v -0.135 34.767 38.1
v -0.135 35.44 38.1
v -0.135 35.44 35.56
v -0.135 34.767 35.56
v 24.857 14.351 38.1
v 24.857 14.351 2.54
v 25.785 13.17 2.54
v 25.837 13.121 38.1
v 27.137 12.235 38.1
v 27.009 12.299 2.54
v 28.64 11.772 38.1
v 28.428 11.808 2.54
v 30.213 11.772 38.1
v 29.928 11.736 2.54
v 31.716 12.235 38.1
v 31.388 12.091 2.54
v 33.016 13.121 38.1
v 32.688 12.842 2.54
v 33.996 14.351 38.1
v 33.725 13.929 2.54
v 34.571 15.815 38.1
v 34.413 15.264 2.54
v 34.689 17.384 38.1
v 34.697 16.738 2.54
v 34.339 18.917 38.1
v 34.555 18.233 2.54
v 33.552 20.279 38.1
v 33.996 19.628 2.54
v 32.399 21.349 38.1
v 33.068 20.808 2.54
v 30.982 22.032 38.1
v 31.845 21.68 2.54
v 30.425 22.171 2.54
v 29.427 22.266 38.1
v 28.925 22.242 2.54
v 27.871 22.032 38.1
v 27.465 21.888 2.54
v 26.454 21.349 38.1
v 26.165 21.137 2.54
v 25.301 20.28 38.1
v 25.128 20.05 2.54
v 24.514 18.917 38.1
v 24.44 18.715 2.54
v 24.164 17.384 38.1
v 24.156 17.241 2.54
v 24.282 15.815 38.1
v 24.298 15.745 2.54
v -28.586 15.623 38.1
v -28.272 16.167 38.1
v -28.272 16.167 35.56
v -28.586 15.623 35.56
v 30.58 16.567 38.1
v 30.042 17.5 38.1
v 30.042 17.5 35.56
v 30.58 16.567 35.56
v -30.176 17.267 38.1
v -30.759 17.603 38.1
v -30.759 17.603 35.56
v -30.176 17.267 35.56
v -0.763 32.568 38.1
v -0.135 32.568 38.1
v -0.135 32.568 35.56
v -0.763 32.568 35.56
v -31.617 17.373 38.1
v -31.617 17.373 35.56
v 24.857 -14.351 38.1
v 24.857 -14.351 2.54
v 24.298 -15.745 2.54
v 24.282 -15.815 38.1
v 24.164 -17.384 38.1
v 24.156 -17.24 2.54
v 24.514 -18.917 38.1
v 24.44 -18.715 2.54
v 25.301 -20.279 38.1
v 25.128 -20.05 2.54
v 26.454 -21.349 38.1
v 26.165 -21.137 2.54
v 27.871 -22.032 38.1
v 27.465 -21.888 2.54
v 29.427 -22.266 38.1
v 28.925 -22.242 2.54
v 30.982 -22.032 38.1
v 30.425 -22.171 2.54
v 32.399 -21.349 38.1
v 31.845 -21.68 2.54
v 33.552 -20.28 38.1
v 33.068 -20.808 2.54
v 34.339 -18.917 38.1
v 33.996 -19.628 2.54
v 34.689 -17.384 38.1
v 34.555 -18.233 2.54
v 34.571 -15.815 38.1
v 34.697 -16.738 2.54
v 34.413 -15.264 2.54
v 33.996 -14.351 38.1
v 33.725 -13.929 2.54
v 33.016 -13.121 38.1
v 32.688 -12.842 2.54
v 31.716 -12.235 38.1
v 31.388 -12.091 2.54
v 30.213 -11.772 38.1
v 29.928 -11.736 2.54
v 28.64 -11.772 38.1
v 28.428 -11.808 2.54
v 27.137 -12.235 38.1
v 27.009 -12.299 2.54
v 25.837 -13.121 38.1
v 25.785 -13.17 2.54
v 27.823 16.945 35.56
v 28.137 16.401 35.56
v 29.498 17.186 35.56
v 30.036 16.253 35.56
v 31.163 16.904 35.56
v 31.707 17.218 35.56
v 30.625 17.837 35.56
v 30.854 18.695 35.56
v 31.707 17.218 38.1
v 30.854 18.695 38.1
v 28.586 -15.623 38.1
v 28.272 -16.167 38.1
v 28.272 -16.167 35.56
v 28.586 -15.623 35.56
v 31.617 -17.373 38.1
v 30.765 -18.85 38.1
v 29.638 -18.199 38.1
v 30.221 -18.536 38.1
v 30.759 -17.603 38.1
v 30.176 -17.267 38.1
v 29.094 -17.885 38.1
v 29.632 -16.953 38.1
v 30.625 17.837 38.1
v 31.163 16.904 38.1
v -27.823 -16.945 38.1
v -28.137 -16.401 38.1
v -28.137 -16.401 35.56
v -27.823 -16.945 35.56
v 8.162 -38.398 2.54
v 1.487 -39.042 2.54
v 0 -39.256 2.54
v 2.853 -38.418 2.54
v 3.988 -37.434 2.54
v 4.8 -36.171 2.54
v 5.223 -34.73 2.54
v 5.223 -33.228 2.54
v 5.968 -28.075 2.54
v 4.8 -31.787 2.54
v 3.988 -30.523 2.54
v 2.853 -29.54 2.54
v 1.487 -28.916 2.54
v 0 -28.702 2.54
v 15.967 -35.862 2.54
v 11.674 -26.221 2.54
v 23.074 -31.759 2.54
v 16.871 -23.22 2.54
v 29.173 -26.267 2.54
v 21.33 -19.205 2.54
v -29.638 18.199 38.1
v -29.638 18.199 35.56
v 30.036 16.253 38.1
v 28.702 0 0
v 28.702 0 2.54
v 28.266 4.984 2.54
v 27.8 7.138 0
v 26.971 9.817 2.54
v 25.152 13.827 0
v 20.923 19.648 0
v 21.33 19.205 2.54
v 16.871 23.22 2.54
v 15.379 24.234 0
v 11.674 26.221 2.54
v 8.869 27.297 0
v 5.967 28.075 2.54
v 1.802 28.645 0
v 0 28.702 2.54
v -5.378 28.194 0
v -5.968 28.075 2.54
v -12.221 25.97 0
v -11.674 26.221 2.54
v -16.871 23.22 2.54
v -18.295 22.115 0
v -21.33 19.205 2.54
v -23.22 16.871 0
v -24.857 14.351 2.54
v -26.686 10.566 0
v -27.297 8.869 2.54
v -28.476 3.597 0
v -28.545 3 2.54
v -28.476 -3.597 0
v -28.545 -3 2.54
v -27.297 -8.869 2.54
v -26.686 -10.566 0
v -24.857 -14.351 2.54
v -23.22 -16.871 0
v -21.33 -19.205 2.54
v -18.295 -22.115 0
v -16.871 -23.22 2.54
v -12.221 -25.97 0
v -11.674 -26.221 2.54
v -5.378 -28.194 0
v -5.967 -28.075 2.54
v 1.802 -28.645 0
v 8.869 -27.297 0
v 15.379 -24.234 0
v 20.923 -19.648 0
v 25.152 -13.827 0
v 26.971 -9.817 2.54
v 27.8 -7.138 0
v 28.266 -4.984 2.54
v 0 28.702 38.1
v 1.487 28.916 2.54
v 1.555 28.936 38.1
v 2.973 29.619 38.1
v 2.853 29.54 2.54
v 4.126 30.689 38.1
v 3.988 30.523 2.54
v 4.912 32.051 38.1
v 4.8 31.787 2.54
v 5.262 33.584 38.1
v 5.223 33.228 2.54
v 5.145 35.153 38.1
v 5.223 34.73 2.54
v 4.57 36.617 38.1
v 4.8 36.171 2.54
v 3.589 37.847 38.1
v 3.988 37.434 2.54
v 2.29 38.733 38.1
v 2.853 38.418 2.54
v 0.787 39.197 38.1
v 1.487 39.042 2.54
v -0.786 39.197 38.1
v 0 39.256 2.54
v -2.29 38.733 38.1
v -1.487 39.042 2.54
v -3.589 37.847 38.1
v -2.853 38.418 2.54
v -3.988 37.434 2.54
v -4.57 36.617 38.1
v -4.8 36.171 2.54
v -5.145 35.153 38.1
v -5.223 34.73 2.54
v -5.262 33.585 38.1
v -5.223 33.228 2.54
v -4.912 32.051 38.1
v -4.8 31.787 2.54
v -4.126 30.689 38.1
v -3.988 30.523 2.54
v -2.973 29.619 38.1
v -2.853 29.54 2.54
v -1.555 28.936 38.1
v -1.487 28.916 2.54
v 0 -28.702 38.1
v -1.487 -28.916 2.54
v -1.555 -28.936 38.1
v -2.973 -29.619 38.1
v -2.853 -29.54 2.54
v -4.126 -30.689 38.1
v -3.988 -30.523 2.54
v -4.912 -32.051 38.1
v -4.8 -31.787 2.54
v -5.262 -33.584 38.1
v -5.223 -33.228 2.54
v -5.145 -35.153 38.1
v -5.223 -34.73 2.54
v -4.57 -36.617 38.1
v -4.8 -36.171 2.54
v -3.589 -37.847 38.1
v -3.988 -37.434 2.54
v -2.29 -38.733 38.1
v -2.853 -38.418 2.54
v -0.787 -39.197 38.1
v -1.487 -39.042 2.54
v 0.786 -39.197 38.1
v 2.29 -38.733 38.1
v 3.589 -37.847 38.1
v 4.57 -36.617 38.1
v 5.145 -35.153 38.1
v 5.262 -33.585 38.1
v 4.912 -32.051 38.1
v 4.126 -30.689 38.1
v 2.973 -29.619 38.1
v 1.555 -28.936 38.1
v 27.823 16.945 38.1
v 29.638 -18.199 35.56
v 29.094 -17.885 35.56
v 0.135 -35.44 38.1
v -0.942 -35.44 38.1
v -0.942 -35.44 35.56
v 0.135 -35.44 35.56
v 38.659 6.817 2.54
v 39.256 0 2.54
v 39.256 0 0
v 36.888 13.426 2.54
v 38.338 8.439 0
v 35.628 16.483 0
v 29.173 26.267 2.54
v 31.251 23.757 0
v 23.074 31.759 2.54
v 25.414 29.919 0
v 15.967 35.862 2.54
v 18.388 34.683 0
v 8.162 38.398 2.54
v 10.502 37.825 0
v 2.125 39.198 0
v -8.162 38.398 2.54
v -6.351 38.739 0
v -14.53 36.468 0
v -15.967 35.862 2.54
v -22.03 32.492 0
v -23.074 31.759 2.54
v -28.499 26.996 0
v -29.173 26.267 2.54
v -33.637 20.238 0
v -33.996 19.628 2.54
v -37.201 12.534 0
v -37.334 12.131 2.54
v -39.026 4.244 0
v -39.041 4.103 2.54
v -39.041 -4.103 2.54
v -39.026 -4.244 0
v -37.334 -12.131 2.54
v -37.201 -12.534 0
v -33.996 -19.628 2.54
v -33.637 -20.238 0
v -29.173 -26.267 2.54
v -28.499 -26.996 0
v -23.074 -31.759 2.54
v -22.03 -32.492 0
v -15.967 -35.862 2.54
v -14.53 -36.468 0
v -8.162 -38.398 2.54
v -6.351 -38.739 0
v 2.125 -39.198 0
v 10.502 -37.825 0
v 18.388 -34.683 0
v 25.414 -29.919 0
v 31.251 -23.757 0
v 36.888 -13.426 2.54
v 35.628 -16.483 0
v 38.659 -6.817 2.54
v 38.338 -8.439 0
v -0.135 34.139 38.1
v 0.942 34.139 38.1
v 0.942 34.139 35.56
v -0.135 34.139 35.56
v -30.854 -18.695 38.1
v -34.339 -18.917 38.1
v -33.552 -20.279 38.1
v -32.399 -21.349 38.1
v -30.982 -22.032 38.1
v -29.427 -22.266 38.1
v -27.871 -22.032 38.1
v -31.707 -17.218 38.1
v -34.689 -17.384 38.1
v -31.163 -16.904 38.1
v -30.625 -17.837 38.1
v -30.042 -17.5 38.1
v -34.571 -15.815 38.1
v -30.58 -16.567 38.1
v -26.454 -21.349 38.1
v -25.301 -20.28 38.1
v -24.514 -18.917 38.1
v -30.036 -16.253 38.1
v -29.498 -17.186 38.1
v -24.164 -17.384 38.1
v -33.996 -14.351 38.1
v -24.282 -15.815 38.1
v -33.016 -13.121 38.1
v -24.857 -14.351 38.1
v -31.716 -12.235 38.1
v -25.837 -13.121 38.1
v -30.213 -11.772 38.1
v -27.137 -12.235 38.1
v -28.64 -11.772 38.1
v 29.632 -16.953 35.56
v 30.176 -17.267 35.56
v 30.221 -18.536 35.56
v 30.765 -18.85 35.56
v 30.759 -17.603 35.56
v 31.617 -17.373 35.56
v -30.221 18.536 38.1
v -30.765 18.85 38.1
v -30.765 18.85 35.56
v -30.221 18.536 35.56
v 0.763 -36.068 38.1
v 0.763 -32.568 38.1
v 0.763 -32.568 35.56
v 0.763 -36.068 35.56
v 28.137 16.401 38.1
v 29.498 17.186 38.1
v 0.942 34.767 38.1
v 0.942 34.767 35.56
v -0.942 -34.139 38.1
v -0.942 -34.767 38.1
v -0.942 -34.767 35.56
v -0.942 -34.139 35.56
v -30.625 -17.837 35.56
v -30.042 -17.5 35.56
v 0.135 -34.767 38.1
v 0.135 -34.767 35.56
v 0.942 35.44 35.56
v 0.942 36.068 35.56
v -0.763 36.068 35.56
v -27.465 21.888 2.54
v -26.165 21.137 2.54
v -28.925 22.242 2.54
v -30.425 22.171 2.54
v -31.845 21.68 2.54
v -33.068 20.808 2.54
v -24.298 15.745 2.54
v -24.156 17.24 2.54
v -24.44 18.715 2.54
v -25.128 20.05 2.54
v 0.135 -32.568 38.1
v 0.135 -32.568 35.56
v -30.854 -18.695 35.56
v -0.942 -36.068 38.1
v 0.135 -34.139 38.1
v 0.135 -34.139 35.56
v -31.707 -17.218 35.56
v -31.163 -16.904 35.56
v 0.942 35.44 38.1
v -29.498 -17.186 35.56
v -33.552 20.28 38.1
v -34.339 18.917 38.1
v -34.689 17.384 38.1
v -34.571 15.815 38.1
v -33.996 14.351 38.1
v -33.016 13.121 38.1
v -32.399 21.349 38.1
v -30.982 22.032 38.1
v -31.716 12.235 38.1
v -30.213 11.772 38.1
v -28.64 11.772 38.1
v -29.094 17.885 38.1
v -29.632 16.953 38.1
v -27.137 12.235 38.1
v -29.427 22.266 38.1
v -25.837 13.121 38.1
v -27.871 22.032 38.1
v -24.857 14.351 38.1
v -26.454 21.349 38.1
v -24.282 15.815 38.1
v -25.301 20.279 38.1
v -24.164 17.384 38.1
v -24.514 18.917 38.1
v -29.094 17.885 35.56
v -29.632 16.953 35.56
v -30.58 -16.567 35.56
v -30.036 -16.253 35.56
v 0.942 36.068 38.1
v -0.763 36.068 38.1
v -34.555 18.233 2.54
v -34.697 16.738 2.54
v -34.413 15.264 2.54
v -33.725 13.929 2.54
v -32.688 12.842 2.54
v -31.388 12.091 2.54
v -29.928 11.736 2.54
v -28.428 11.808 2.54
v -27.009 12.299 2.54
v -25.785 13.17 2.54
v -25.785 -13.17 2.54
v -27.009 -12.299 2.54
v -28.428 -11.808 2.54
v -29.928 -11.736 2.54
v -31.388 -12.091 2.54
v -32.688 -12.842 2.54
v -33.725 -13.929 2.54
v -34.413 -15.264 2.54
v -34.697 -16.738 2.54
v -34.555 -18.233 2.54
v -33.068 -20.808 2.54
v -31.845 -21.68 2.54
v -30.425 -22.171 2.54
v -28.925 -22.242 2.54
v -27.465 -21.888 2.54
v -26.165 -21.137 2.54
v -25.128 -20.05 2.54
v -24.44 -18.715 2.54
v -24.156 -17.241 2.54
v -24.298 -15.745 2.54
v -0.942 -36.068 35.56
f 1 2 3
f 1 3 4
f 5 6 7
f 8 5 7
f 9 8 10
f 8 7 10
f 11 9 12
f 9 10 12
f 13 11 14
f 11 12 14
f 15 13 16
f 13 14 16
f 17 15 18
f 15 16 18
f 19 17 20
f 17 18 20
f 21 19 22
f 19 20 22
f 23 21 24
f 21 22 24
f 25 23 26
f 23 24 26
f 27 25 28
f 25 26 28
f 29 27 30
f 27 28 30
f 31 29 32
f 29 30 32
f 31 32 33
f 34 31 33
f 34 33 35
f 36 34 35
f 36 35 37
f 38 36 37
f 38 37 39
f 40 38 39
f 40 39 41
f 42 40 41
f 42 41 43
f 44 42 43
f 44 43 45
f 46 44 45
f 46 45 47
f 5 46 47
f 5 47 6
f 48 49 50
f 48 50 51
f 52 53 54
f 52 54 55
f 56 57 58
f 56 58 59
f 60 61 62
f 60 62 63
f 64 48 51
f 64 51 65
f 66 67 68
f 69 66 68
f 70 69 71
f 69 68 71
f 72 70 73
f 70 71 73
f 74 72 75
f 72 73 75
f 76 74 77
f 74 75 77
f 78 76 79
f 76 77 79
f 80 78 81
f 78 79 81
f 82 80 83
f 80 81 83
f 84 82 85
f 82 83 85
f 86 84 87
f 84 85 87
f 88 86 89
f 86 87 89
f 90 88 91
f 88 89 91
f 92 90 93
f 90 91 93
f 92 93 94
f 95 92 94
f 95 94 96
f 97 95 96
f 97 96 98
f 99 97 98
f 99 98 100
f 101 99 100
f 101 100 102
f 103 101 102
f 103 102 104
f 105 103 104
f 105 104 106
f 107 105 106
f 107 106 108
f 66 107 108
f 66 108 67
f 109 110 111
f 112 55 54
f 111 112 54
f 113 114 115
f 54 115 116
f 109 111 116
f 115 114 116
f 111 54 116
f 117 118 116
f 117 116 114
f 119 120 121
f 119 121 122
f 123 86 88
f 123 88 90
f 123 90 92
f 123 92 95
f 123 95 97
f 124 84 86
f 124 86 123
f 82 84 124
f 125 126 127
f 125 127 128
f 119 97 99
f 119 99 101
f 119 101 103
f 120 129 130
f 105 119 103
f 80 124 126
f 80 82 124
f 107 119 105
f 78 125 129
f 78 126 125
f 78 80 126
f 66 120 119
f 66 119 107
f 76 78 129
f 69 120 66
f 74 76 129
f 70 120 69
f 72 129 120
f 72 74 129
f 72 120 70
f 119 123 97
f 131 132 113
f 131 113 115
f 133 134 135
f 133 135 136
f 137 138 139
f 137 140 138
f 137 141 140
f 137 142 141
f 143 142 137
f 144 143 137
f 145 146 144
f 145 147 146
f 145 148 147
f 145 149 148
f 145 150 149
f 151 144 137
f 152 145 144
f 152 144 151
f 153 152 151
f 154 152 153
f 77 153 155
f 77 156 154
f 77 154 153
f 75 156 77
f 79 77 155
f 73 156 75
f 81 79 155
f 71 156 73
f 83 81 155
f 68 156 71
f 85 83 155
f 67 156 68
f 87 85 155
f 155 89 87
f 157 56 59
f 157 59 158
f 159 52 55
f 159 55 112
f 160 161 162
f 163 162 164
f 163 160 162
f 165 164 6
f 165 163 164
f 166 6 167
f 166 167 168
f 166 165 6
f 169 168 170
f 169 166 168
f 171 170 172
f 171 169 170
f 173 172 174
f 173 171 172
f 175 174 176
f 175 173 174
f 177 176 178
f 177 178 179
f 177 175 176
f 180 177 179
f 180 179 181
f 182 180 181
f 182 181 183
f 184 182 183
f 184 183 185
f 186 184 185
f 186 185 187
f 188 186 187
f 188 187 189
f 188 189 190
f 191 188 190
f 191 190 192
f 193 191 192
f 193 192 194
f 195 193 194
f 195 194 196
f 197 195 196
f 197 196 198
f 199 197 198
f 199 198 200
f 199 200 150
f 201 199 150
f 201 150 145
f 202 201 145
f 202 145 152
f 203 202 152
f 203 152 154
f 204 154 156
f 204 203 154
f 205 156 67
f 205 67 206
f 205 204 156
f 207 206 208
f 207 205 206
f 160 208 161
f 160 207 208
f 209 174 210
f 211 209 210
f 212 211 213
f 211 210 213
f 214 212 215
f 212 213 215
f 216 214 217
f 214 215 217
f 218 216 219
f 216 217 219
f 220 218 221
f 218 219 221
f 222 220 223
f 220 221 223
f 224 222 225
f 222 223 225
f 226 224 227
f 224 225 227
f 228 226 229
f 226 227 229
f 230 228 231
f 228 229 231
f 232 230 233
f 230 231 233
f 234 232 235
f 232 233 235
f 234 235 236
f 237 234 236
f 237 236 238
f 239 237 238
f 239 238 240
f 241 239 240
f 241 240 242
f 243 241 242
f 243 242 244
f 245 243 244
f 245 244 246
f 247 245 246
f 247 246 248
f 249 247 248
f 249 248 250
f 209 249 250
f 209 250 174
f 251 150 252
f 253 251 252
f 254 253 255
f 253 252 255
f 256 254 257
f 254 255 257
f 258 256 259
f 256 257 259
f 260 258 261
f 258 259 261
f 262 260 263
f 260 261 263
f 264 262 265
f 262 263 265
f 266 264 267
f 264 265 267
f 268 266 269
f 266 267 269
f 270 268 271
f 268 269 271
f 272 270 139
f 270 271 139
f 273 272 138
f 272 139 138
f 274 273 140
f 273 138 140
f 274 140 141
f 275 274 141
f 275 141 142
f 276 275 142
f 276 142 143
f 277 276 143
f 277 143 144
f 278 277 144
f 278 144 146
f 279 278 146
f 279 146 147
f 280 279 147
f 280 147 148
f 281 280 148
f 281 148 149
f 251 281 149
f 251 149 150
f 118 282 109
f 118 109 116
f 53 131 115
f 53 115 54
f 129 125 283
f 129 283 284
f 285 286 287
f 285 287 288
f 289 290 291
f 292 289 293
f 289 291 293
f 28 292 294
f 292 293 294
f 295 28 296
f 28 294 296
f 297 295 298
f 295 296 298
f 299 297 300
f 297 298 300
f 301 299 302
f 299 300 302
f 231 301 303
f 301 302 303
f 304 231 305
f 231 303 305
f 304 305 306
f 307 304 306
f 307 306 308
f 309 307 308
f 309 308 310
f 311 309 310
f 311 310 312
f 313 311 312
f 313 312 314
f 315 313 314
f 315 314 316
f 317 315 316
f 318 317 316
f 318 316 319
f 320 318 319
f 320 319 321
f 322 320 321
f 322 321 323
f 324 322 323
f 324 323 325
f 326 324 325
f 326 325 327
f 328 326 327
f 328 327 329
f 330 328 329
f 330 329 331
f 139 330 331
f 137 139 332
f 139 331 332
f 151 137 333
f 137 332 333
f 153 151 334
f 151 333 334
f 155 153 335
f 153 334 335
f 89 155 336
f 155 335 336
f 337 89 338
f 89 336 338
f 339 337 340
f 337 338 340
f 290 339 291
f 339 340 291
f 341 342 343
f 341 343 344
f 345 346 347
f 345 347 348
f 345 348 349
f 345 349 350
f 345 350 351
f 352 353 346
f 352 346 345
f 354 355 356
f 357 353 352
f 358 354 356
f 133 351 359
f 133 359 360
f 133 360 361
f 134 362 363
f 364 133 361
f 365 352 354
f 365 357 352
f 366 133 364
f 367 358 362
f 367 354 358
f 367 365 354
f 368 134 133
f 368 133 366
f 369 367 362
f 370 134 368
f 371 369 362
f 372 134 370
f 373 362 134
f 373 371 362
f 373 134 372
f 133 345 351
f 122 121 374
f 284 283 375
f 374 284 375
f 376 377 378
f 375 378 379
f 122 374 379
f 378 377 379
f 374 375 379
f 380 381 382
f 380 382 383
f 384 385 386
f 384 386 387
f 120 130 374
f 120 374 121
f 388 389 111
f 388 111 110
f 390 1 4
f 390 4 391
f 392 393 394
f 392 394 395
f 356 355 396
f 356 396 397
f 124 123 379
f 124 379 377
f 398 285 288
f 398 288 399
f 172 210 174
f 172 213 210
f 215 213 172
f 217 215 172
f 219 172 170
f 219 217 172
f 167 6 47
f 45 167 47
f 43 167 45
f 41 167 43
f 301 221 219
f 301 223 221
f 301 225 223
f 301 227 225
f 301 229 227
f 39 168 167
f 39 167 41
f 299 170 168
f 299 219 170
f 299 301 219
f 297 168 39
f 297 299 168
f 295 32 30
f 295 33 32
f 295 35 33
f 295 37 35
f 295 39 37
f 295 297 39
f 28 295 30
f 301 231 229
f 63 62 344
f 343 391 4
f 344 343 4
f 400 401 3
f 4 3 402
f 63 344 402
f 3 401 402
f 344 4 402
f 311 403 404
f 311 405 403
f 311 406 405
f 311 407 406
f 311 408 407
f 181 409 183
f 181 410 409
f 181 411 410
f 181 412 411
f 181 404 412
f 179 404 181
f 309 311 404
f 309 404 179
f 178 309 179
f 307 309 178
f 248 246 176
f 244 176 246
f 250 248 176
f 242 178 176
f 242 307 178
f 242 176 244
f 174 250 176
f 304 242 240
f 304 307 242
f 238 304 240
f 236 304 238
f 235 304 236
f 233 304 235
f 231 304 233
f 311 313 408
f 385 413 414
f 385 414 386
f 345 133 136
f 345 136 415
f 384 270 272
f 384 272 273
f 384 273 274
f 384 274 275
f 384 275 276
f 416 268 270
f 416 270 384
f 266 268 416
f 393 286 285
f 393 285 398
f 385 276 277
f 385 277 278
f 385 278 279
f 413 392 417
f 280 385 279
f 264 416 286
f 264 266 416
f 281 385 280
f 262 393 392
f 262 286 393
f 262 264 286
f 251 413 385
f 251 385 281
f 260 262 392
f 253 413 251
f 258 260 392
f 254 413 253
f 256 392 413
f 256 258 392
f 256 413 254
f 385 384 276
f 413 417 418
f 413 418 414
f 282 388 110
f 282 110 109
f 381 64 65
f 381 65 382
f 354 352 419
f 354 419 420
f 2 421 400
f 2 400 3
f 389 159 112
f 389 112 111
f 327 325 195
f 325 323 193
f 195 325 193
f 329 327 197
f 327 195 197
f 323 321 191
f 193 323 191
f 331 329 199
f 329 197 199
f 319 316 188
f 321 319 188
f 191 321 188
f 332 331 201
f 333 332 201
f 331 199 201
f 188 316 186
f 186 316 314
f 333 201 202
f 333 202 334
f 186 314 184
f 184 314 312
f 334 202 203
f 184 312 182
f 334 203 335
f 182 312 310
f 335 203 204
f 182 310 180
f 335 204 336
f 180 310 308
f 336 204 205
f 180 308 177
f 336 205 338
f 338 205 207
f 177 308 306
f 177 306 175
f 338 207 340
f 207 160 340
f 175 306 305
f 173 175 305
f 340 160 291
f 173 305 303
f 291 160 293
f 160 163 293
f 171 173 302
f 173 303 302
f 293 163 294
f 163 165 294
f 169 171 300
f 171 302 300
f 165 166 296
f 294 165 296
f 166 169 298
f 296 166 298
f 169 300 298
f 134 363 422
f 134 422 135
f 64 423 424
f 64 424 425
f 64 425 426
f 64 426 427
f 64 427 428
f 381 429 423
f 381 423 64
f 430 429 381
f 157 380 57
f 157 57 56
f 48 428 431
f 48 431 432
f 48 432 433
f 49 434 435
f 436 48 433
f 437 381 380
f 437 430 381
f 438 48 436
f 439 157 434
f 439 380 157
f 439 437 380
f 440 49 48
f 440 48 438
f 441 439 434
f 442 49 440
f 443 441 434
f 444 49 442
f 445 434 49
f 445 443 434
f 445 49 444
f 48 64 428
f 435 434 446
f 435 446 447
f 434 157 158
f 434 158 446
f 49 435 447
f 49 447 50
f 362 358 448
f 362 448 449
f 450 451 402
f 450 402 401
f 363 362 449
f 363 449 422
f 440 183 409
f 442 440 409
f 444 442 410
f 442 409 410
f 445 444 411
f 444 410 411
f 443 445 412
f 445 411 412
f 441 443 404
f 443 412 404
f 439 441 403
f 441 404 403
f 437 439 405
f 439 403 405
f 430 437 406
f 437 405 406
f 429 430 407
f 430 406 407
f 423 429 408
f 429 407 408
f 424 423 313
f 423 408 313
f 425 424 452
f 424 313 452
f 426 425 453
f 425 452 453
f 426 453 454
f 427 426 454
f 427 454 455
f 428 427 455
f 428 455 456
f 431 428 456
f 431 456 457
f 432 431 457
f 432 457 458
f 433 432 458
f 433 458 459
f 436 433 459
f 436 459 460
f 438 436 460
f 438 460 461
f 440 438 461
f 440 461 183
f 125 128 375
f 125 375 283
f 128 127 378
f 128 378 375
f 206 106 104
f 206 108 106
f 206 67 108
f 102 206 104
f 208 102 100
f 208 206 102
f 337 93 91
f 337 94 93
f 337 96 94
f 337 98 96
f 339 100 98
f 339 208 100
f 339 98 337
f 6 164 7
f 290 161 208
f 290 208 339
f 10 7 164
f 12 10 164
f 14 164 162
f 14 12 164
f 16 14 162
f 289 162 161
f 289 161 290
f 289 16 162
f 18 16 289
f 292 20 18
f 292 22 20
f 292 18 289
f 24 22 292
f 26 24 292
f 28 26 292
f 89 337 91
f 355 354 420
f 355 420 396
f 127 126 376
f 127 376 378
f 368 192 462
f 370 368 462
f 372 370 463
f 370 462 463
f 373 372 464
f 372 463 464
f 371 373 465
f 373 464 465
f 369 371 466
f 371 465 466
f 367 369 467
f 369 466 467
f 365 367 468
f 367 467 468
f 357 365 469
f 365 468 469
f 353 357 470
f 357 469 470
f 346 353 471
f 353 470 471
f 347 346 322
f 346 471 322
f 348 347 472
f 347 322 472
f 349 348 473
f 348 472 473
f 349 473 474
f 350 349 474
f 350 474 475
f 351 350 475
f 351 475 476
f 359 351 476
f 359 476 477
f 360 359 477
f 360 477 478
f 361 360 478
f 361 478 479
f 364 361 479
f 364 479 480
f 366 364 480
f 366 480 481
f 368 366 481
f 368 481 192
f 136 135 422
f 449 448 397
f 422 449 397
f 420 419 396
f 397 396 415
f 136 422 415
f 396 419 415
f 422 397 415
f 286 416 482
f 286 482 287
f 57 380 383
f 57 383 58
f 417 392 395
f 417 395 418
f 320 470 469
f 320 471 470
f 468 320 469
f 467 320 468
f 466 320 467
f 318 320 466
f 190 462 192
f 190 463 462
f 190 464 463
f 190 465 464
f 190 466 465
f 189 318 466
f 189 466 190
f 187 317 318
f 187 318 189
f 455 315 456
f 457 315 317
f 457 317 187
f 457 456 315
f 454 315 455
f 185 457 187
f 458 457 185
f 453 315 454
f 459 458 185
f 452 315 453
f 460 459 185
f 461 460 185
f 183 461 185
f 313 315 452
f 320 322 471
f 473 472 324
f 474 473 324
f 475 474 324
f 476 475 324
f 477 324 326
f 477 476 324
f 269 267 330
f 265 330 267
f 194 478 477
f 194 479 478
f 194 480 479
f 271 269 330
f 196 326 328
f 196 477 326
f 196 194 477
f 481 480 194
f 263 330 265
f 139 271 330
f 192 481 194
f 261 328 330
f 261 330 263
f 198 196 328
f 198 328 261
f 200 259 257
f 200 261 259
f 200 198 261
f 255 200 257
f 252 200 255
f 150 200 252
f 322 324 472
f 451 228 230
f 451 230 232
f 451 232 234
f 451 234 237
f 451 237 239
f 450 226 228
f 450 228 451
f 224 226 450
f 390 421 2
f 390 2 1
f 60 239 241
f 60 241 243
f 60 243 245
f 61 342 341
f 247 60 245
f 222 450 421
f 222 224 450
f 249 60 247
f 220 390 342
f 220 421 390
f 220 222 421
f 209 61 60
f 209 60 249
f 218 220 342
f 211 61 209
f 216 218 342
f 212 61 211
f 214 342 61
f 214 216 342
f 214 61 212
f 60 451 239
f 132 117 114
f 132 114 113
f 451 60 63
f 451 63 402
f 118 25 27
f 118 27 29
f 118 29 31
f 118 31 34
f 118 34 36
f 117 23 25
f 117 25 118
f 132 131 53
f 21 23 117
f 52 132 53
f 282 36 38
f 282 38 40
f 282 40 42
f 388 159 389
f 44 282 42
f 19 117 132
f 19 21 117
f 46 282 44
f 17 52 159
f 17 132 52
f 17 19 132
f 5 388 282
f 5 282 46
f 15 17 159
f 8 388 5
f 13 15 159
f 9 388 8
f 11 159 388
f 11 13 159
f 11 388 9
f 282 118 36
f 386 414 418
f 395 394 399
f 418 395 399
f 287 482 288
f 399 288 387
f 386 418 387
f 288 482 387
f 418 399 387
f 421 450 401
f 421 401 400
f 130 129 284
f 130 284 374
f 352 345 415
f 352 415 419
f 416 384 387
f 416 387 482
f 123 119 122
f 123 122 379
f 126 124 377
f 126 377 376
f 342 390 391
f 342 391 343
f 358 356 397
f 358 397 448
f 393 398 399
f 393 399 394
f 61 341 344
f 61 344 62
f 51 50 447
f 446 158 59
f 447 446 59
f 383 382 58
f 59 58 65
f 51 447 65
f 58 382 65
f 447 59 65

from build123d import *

# Parameters (mm, degrees)
SKETCH2_R           = 39.2557
SKETCH2_R_2         = 28.702
BOSS_EXTRUDE1_DEPTH = 2.54
SKETCH3_R           = 5.27685
BOSS_EXTRUDE2_DEPTH = 35.56
CUT_EXTRUDE1_DEPTH  = 2.54
CIRPATTERN1_COUNT   = 6


with BuildPart() as part:
    # Sketch2 → Boss-Extrude1 (new body)
    with BuildSketch(Plane.XY):
        Circle(SKETCH2_R)
        Circle(SKETCH2_R_2, mode=Mode.SUBTRACT)
    extrude(amount=BOSS_EXTRUDE1_DEPTH)

    # Sketch3 → Boss-Extrude2 (add)
    with BuildSketch(Plane.XY.offset(2.54)):
        with Locations(Location((0, 33.97885, 0), (0, 0, 269.999675818))):
            Circle(SKETCH3_R)
    boss_extrude2 = extrude(amount=BOSS_EXTRUDE2_DEPTH)

    # Sketch4 → Cut-Extrude1 (cut)
    with BuildSketch(Plane.XY.offset(38.1)):
        Polygon((-0.762820513, 36.068090357), (0.942307692, 36.068090357), (0.942307692, 35.439885228), (-0.134615385, 35.439885228), (-0.134615385, 34.766808305), (0.942307692, 34.766808305), (0.942307692, 34.138603177), (-0.134615385, 34.138603177), (-0.134615385, 32.568090357), (-0.762820513, 32.568090357), align=None)
    cut_extrude1 = extrude(amount=-CUT_EXTRUDE1_DEPTH, mode=Mode.SUBTRACT)

    # CirPattern1: Boss-Extrude2, Cut-Extrude1 ×6 about axis
    cirpattern1_axis = Axis((0, 0, 0), (0, 0, 1))
    add([boss_extrude2.rotate(cirpattern1_axis, i * 360 / CIRPATTERN1_COUNT) for i in range(1, CIRPATTERN1_COUNT)])
    add([cut_extrude1.rotate(cirpattern1_axis, i * 360 / CIRPATTERN1_COUNT) for i in range(1, CIRPATTERN1_COUNT)], mode=Mode.SUBTRACT)


solid = part.part
